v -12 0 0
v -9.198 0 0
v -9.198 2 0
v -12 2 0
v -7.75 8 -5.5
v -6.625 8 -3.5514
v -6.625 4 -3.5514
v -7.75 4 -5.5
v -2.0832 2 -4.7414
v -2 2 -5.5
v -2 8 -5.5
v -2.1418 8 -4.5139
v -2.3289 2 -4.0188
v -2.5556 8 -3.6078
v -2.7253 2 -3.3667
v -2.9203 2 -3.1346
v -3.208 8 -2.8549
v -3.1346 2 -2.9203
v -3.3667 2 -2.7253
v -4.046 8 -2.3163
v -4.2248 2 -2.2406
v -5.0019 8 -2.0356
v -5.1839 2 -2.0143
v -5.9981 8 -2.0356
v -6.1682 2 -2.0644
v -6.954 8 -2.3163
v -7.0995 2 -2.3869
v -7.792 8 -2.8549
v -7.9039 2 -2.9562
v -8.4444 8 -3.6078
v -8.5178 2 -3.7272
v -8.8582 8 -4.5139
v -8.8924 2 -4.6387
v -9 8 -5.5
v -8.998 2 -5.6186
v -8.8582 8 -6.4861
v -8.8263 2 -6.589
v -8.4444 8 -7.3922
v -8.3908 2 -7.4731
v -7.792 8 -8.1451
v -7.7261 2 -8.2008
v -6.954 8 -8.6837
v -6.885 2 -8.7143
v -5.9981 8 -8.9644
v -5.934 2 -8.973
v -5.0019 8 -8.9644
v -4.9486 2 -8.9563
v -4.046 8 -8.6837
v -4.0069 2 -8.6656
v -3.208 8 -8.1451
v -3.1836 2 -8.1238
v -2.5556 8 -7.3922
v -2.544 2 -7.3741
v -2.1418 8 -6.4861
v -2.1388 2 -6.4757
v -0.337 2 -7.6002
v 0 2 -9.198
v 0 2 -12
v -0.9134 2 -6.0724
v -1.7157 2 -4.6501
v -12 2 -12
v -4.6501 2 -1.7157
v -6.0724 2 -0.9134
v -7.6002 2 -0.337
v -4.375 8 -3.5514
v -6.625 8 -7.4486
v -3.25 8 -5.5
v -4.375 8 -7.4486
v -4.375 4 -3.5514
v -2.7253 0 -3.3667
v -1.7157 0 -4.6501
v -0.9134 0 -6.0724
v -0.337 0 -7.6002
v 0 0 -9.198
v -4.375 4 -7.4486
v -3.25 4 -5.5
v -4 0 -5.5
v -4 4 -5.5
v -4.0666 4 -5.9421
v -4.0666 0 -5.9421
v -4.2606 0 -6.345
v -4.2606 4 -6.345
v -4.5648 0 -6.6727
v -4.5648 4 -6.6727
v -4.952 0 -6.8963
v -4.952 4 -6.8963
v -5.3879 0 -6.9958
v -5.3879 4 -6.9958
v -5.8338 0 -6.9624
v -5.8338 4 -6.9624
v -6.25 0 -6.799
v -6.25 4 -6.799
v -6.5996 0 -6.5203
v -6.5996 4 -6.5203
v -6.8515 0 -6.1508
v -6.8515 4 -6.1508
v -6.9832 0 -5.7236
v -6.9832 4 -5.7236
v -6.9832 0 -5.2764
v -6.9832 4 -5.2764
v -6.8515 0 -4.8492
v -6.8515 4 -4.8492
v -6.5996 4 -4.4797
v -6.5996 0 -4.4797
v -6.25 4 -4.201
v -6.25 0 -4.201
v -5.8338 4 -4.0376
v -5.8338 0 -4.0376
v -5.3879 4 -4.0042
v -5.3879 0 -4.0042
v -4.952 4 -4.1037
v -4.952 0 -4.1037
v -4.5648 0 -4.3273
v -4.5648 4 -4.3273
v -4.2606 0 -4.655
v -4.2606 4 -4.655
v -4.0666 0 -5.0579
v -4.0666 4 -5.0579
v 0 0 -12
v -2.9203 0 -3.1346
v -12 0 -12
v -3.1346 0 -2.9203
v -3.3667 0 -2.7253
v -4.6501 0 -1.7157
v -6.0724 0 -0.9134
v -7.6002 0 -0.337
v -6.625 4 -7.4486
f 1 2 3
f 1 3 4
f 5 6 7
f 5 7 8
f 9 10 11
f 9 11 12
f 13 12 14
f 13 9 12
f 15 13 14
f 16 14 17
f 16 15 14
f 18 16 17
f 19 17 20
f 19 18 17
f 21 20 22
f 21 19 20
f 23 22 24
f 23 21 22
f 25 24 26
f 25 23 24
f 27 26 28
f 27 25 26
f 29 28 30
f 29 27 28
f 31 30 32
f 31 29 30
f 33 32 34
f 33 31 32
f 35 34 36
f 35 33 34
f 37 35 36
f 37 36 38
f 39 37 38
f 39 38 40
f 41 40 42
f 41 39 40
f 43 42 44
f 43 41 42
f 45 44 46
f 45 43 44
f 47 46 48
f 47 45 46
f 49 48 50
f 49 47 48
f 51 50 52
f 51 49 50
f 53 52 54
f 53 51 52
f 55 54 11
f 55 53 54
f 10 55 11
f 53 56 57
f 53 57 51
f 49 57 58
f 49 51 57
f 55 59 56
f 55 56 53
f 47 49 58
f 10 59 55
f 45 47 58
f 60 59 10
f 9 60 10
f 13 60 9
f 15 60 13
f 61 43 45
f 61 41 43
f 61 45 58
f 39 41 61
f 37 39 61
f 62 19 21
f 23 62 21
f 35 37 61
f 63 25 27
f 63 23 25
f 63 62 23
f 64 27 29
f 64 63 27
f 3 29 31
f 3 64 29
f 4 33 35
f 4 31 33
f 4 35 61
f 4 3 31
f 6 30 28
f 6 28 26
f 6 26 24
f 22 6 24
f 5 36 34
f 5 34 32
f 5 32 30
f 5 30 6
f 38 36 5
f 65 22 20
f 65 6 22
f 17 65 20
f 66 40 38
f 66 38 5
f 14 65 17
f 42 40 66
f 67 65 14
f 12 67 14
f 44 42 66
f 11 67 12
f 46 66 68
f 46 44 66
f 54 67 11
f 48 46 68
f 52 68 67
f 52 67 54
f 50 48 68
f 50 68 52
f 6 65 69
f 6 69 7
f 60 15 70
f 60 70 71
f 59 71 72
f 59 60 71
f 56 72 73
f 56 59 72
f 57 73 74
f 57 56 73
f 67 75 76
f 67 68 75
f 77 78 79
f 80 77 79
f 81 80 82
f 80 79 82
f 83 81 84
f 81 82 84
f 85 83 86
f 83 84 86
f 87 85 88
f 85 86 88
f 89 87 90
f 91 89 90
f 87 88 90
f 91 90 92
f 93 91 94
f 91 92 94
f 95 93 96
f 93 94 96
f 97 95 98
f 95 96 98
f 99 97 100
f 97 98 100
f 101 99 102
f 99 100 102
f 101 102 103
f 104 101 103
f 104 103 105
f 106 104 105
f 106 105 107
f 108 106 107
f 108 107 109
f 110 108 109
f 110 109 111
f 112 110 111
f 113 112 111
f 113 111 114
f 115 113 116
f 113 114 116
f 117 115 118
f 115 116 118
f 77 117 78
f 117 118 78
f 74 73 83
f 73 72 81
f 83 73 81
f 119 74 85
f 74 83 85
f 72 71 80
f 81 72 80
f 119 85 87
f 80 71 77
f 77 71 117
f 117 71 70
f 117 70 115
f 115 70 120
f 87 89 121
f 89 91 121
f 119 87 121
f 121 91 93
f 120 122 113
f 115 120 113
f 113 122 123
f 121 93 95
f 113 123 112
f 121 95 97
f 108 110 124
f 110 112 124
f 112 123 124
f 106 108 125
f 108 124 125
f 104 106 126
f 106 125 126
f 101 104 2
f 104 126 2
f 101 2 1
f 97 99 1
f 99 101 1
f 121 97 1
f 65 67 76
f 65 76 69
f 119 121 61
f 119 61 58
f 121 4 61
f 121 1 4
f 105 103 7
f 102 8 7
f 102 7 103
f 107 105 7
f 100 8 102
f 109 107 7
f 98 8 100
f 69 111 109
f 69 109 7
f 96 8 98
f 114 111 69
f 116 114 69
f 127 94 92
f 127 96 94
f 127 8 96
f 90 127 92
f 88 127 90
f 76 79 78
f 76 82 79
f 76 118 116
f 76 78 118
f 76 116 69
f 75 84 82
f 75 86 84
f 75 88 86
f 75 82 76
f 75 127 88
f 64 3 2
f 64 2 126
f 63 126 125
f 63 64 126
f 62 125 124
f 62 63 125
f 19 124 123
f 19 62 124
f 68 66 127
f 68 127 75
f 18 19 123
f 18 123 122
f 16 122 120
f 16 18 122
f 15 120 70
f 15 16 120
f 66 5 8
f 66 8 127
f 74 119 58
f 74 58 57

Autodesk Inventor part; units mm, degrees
ref_plane "YZ Plane" through (0, 0, 0) normal (1, 0, 0) x (0, 1, 0)
ref_plane "XZ Plane" through (0, 0, 0) normal (0, 1, 0) x (-1, 0, 0)
ref_plane "XY Plane" through (0, 0, 0) normal (0, 0, 1) x (1, 0, 0)
sketch "Эскиз1" plane through (0, 0, 0) normal (0, 1, 0) x (-1, 0, 0)
  line L0 (0, 0) -> (12, 0)
  line L1 (12, 0) -> (12, -12)
  line L2 (12, -12) -> (0, -12)
  line L3 (0, -12) -> (0, 0)
  dimension "d0" = 12
  dimension "d1" = 12
extrude "Выдавливание1" add sketch "Эскиз1" along normal blind 2
sketch "Эскиз2" plane through (0, 2, 0) normal (0, 1, 0) x (1, 0, 0)
  line L0 (0, 12) -> (-12, 12) projected
  line L1 (0, 0) -> (0, 12) projected
  line L2 (-12, 12) -> (0, 12)
  line L3 (0, 12) -> (0, 0)
  line L4 (0, 0) -> (-12, 0)
  line L5 (-12, 0) -> (-12, 12)
  circle A0 centre (-5.5, 5.5) radius 5.5
  circle A1 centre (-5.5, 5.5) radius 3.5
  line L6 (-12, 12) -> (-12, 0) projected
  line L7 (-12, 11) -> (0, 11)
  line L8 (-11, 12) -> (-11, 0)
  line L9 (-12, 0) -> (0, 0) projected
  dimension "d5" = 7
  dimension "d19" = 1
  dimension "d20" = 1
  dimension "d21" = 11
extrude "Выдавливание2" add sketch "Эскиз2" along normal blind 6 contours A1
sketch "Эскиз3" plane through (-5.5, 8, -5.5) normal (0, 1, 0) x (1, 0, 0)
  circle A0 centre (0, 0) radius 3.5 projected
  circle A1 centre (0, 0) radius 1.5
  point P0 (5.5, -5.5)
  dimension "d8" = 3
extrude "Выдавливание3" cut sketch "Эскиз3" against normal blind 8 contours A1
sketch "Эскиз5" plane through (-5.5, 8, -5.5) normal (0, 1, 0) x (1, 0, 0)
  circle A0 centre (0, 0) radius 1.5 projected
  circle A1 centre (0, 0) radius 2.25
  line L0 (2.25, 0) -> (1.125, -1.9486)
  line L1 (1.125, -1.9486) -> (-1.125, -1.9486)
  line L2 (-1.125, -1.9486) -> (-2.25, 0)
  line L3 (-2.25, 0) -> (-1.125, 1.9486)
  line L4 (-1.125, 1.9486) -> (1.125, 1.9486)
  line L5 (1.125, 1.9486) -> (2.25, 0)
  point P0 (5.5, -5.5)
  dimension "d14" = 4.5
extrude "Выдавливание5" cut sketch "Эскиз5" against normal blind 4 contours L0 L1 L2 L3 L4 L5
sketch "Эскиз6" plane through (0, 2, 0) normal (0, 1, 0) x (1, 0, 0)
  line L0 (-12, 0) -> (0, 0) projected
  line L1 (0, 0) -> (0, 12) projected
  line L2 (0, 12) -> (0, 0)
  line L3 (0, 0) -> (-12, 0)
  circle A0 centre (-5.5, 5.5) radius 3.5 projected
  arc A1 (-12, 0) -> (0, 12) centre (-10.599, 10.599) ccw
  point P0 (0, 9.1981)
  point P1 (-2.7251, 3.3669)
  point P2 (-3.3669, 2.7251)
  point P3 (-9.1981, 0)
extrude "Выдавливание6" cut sketch "Эскиз6" against normal blind 4 contours A1 A0 L1 L0
properties part number "holder"
